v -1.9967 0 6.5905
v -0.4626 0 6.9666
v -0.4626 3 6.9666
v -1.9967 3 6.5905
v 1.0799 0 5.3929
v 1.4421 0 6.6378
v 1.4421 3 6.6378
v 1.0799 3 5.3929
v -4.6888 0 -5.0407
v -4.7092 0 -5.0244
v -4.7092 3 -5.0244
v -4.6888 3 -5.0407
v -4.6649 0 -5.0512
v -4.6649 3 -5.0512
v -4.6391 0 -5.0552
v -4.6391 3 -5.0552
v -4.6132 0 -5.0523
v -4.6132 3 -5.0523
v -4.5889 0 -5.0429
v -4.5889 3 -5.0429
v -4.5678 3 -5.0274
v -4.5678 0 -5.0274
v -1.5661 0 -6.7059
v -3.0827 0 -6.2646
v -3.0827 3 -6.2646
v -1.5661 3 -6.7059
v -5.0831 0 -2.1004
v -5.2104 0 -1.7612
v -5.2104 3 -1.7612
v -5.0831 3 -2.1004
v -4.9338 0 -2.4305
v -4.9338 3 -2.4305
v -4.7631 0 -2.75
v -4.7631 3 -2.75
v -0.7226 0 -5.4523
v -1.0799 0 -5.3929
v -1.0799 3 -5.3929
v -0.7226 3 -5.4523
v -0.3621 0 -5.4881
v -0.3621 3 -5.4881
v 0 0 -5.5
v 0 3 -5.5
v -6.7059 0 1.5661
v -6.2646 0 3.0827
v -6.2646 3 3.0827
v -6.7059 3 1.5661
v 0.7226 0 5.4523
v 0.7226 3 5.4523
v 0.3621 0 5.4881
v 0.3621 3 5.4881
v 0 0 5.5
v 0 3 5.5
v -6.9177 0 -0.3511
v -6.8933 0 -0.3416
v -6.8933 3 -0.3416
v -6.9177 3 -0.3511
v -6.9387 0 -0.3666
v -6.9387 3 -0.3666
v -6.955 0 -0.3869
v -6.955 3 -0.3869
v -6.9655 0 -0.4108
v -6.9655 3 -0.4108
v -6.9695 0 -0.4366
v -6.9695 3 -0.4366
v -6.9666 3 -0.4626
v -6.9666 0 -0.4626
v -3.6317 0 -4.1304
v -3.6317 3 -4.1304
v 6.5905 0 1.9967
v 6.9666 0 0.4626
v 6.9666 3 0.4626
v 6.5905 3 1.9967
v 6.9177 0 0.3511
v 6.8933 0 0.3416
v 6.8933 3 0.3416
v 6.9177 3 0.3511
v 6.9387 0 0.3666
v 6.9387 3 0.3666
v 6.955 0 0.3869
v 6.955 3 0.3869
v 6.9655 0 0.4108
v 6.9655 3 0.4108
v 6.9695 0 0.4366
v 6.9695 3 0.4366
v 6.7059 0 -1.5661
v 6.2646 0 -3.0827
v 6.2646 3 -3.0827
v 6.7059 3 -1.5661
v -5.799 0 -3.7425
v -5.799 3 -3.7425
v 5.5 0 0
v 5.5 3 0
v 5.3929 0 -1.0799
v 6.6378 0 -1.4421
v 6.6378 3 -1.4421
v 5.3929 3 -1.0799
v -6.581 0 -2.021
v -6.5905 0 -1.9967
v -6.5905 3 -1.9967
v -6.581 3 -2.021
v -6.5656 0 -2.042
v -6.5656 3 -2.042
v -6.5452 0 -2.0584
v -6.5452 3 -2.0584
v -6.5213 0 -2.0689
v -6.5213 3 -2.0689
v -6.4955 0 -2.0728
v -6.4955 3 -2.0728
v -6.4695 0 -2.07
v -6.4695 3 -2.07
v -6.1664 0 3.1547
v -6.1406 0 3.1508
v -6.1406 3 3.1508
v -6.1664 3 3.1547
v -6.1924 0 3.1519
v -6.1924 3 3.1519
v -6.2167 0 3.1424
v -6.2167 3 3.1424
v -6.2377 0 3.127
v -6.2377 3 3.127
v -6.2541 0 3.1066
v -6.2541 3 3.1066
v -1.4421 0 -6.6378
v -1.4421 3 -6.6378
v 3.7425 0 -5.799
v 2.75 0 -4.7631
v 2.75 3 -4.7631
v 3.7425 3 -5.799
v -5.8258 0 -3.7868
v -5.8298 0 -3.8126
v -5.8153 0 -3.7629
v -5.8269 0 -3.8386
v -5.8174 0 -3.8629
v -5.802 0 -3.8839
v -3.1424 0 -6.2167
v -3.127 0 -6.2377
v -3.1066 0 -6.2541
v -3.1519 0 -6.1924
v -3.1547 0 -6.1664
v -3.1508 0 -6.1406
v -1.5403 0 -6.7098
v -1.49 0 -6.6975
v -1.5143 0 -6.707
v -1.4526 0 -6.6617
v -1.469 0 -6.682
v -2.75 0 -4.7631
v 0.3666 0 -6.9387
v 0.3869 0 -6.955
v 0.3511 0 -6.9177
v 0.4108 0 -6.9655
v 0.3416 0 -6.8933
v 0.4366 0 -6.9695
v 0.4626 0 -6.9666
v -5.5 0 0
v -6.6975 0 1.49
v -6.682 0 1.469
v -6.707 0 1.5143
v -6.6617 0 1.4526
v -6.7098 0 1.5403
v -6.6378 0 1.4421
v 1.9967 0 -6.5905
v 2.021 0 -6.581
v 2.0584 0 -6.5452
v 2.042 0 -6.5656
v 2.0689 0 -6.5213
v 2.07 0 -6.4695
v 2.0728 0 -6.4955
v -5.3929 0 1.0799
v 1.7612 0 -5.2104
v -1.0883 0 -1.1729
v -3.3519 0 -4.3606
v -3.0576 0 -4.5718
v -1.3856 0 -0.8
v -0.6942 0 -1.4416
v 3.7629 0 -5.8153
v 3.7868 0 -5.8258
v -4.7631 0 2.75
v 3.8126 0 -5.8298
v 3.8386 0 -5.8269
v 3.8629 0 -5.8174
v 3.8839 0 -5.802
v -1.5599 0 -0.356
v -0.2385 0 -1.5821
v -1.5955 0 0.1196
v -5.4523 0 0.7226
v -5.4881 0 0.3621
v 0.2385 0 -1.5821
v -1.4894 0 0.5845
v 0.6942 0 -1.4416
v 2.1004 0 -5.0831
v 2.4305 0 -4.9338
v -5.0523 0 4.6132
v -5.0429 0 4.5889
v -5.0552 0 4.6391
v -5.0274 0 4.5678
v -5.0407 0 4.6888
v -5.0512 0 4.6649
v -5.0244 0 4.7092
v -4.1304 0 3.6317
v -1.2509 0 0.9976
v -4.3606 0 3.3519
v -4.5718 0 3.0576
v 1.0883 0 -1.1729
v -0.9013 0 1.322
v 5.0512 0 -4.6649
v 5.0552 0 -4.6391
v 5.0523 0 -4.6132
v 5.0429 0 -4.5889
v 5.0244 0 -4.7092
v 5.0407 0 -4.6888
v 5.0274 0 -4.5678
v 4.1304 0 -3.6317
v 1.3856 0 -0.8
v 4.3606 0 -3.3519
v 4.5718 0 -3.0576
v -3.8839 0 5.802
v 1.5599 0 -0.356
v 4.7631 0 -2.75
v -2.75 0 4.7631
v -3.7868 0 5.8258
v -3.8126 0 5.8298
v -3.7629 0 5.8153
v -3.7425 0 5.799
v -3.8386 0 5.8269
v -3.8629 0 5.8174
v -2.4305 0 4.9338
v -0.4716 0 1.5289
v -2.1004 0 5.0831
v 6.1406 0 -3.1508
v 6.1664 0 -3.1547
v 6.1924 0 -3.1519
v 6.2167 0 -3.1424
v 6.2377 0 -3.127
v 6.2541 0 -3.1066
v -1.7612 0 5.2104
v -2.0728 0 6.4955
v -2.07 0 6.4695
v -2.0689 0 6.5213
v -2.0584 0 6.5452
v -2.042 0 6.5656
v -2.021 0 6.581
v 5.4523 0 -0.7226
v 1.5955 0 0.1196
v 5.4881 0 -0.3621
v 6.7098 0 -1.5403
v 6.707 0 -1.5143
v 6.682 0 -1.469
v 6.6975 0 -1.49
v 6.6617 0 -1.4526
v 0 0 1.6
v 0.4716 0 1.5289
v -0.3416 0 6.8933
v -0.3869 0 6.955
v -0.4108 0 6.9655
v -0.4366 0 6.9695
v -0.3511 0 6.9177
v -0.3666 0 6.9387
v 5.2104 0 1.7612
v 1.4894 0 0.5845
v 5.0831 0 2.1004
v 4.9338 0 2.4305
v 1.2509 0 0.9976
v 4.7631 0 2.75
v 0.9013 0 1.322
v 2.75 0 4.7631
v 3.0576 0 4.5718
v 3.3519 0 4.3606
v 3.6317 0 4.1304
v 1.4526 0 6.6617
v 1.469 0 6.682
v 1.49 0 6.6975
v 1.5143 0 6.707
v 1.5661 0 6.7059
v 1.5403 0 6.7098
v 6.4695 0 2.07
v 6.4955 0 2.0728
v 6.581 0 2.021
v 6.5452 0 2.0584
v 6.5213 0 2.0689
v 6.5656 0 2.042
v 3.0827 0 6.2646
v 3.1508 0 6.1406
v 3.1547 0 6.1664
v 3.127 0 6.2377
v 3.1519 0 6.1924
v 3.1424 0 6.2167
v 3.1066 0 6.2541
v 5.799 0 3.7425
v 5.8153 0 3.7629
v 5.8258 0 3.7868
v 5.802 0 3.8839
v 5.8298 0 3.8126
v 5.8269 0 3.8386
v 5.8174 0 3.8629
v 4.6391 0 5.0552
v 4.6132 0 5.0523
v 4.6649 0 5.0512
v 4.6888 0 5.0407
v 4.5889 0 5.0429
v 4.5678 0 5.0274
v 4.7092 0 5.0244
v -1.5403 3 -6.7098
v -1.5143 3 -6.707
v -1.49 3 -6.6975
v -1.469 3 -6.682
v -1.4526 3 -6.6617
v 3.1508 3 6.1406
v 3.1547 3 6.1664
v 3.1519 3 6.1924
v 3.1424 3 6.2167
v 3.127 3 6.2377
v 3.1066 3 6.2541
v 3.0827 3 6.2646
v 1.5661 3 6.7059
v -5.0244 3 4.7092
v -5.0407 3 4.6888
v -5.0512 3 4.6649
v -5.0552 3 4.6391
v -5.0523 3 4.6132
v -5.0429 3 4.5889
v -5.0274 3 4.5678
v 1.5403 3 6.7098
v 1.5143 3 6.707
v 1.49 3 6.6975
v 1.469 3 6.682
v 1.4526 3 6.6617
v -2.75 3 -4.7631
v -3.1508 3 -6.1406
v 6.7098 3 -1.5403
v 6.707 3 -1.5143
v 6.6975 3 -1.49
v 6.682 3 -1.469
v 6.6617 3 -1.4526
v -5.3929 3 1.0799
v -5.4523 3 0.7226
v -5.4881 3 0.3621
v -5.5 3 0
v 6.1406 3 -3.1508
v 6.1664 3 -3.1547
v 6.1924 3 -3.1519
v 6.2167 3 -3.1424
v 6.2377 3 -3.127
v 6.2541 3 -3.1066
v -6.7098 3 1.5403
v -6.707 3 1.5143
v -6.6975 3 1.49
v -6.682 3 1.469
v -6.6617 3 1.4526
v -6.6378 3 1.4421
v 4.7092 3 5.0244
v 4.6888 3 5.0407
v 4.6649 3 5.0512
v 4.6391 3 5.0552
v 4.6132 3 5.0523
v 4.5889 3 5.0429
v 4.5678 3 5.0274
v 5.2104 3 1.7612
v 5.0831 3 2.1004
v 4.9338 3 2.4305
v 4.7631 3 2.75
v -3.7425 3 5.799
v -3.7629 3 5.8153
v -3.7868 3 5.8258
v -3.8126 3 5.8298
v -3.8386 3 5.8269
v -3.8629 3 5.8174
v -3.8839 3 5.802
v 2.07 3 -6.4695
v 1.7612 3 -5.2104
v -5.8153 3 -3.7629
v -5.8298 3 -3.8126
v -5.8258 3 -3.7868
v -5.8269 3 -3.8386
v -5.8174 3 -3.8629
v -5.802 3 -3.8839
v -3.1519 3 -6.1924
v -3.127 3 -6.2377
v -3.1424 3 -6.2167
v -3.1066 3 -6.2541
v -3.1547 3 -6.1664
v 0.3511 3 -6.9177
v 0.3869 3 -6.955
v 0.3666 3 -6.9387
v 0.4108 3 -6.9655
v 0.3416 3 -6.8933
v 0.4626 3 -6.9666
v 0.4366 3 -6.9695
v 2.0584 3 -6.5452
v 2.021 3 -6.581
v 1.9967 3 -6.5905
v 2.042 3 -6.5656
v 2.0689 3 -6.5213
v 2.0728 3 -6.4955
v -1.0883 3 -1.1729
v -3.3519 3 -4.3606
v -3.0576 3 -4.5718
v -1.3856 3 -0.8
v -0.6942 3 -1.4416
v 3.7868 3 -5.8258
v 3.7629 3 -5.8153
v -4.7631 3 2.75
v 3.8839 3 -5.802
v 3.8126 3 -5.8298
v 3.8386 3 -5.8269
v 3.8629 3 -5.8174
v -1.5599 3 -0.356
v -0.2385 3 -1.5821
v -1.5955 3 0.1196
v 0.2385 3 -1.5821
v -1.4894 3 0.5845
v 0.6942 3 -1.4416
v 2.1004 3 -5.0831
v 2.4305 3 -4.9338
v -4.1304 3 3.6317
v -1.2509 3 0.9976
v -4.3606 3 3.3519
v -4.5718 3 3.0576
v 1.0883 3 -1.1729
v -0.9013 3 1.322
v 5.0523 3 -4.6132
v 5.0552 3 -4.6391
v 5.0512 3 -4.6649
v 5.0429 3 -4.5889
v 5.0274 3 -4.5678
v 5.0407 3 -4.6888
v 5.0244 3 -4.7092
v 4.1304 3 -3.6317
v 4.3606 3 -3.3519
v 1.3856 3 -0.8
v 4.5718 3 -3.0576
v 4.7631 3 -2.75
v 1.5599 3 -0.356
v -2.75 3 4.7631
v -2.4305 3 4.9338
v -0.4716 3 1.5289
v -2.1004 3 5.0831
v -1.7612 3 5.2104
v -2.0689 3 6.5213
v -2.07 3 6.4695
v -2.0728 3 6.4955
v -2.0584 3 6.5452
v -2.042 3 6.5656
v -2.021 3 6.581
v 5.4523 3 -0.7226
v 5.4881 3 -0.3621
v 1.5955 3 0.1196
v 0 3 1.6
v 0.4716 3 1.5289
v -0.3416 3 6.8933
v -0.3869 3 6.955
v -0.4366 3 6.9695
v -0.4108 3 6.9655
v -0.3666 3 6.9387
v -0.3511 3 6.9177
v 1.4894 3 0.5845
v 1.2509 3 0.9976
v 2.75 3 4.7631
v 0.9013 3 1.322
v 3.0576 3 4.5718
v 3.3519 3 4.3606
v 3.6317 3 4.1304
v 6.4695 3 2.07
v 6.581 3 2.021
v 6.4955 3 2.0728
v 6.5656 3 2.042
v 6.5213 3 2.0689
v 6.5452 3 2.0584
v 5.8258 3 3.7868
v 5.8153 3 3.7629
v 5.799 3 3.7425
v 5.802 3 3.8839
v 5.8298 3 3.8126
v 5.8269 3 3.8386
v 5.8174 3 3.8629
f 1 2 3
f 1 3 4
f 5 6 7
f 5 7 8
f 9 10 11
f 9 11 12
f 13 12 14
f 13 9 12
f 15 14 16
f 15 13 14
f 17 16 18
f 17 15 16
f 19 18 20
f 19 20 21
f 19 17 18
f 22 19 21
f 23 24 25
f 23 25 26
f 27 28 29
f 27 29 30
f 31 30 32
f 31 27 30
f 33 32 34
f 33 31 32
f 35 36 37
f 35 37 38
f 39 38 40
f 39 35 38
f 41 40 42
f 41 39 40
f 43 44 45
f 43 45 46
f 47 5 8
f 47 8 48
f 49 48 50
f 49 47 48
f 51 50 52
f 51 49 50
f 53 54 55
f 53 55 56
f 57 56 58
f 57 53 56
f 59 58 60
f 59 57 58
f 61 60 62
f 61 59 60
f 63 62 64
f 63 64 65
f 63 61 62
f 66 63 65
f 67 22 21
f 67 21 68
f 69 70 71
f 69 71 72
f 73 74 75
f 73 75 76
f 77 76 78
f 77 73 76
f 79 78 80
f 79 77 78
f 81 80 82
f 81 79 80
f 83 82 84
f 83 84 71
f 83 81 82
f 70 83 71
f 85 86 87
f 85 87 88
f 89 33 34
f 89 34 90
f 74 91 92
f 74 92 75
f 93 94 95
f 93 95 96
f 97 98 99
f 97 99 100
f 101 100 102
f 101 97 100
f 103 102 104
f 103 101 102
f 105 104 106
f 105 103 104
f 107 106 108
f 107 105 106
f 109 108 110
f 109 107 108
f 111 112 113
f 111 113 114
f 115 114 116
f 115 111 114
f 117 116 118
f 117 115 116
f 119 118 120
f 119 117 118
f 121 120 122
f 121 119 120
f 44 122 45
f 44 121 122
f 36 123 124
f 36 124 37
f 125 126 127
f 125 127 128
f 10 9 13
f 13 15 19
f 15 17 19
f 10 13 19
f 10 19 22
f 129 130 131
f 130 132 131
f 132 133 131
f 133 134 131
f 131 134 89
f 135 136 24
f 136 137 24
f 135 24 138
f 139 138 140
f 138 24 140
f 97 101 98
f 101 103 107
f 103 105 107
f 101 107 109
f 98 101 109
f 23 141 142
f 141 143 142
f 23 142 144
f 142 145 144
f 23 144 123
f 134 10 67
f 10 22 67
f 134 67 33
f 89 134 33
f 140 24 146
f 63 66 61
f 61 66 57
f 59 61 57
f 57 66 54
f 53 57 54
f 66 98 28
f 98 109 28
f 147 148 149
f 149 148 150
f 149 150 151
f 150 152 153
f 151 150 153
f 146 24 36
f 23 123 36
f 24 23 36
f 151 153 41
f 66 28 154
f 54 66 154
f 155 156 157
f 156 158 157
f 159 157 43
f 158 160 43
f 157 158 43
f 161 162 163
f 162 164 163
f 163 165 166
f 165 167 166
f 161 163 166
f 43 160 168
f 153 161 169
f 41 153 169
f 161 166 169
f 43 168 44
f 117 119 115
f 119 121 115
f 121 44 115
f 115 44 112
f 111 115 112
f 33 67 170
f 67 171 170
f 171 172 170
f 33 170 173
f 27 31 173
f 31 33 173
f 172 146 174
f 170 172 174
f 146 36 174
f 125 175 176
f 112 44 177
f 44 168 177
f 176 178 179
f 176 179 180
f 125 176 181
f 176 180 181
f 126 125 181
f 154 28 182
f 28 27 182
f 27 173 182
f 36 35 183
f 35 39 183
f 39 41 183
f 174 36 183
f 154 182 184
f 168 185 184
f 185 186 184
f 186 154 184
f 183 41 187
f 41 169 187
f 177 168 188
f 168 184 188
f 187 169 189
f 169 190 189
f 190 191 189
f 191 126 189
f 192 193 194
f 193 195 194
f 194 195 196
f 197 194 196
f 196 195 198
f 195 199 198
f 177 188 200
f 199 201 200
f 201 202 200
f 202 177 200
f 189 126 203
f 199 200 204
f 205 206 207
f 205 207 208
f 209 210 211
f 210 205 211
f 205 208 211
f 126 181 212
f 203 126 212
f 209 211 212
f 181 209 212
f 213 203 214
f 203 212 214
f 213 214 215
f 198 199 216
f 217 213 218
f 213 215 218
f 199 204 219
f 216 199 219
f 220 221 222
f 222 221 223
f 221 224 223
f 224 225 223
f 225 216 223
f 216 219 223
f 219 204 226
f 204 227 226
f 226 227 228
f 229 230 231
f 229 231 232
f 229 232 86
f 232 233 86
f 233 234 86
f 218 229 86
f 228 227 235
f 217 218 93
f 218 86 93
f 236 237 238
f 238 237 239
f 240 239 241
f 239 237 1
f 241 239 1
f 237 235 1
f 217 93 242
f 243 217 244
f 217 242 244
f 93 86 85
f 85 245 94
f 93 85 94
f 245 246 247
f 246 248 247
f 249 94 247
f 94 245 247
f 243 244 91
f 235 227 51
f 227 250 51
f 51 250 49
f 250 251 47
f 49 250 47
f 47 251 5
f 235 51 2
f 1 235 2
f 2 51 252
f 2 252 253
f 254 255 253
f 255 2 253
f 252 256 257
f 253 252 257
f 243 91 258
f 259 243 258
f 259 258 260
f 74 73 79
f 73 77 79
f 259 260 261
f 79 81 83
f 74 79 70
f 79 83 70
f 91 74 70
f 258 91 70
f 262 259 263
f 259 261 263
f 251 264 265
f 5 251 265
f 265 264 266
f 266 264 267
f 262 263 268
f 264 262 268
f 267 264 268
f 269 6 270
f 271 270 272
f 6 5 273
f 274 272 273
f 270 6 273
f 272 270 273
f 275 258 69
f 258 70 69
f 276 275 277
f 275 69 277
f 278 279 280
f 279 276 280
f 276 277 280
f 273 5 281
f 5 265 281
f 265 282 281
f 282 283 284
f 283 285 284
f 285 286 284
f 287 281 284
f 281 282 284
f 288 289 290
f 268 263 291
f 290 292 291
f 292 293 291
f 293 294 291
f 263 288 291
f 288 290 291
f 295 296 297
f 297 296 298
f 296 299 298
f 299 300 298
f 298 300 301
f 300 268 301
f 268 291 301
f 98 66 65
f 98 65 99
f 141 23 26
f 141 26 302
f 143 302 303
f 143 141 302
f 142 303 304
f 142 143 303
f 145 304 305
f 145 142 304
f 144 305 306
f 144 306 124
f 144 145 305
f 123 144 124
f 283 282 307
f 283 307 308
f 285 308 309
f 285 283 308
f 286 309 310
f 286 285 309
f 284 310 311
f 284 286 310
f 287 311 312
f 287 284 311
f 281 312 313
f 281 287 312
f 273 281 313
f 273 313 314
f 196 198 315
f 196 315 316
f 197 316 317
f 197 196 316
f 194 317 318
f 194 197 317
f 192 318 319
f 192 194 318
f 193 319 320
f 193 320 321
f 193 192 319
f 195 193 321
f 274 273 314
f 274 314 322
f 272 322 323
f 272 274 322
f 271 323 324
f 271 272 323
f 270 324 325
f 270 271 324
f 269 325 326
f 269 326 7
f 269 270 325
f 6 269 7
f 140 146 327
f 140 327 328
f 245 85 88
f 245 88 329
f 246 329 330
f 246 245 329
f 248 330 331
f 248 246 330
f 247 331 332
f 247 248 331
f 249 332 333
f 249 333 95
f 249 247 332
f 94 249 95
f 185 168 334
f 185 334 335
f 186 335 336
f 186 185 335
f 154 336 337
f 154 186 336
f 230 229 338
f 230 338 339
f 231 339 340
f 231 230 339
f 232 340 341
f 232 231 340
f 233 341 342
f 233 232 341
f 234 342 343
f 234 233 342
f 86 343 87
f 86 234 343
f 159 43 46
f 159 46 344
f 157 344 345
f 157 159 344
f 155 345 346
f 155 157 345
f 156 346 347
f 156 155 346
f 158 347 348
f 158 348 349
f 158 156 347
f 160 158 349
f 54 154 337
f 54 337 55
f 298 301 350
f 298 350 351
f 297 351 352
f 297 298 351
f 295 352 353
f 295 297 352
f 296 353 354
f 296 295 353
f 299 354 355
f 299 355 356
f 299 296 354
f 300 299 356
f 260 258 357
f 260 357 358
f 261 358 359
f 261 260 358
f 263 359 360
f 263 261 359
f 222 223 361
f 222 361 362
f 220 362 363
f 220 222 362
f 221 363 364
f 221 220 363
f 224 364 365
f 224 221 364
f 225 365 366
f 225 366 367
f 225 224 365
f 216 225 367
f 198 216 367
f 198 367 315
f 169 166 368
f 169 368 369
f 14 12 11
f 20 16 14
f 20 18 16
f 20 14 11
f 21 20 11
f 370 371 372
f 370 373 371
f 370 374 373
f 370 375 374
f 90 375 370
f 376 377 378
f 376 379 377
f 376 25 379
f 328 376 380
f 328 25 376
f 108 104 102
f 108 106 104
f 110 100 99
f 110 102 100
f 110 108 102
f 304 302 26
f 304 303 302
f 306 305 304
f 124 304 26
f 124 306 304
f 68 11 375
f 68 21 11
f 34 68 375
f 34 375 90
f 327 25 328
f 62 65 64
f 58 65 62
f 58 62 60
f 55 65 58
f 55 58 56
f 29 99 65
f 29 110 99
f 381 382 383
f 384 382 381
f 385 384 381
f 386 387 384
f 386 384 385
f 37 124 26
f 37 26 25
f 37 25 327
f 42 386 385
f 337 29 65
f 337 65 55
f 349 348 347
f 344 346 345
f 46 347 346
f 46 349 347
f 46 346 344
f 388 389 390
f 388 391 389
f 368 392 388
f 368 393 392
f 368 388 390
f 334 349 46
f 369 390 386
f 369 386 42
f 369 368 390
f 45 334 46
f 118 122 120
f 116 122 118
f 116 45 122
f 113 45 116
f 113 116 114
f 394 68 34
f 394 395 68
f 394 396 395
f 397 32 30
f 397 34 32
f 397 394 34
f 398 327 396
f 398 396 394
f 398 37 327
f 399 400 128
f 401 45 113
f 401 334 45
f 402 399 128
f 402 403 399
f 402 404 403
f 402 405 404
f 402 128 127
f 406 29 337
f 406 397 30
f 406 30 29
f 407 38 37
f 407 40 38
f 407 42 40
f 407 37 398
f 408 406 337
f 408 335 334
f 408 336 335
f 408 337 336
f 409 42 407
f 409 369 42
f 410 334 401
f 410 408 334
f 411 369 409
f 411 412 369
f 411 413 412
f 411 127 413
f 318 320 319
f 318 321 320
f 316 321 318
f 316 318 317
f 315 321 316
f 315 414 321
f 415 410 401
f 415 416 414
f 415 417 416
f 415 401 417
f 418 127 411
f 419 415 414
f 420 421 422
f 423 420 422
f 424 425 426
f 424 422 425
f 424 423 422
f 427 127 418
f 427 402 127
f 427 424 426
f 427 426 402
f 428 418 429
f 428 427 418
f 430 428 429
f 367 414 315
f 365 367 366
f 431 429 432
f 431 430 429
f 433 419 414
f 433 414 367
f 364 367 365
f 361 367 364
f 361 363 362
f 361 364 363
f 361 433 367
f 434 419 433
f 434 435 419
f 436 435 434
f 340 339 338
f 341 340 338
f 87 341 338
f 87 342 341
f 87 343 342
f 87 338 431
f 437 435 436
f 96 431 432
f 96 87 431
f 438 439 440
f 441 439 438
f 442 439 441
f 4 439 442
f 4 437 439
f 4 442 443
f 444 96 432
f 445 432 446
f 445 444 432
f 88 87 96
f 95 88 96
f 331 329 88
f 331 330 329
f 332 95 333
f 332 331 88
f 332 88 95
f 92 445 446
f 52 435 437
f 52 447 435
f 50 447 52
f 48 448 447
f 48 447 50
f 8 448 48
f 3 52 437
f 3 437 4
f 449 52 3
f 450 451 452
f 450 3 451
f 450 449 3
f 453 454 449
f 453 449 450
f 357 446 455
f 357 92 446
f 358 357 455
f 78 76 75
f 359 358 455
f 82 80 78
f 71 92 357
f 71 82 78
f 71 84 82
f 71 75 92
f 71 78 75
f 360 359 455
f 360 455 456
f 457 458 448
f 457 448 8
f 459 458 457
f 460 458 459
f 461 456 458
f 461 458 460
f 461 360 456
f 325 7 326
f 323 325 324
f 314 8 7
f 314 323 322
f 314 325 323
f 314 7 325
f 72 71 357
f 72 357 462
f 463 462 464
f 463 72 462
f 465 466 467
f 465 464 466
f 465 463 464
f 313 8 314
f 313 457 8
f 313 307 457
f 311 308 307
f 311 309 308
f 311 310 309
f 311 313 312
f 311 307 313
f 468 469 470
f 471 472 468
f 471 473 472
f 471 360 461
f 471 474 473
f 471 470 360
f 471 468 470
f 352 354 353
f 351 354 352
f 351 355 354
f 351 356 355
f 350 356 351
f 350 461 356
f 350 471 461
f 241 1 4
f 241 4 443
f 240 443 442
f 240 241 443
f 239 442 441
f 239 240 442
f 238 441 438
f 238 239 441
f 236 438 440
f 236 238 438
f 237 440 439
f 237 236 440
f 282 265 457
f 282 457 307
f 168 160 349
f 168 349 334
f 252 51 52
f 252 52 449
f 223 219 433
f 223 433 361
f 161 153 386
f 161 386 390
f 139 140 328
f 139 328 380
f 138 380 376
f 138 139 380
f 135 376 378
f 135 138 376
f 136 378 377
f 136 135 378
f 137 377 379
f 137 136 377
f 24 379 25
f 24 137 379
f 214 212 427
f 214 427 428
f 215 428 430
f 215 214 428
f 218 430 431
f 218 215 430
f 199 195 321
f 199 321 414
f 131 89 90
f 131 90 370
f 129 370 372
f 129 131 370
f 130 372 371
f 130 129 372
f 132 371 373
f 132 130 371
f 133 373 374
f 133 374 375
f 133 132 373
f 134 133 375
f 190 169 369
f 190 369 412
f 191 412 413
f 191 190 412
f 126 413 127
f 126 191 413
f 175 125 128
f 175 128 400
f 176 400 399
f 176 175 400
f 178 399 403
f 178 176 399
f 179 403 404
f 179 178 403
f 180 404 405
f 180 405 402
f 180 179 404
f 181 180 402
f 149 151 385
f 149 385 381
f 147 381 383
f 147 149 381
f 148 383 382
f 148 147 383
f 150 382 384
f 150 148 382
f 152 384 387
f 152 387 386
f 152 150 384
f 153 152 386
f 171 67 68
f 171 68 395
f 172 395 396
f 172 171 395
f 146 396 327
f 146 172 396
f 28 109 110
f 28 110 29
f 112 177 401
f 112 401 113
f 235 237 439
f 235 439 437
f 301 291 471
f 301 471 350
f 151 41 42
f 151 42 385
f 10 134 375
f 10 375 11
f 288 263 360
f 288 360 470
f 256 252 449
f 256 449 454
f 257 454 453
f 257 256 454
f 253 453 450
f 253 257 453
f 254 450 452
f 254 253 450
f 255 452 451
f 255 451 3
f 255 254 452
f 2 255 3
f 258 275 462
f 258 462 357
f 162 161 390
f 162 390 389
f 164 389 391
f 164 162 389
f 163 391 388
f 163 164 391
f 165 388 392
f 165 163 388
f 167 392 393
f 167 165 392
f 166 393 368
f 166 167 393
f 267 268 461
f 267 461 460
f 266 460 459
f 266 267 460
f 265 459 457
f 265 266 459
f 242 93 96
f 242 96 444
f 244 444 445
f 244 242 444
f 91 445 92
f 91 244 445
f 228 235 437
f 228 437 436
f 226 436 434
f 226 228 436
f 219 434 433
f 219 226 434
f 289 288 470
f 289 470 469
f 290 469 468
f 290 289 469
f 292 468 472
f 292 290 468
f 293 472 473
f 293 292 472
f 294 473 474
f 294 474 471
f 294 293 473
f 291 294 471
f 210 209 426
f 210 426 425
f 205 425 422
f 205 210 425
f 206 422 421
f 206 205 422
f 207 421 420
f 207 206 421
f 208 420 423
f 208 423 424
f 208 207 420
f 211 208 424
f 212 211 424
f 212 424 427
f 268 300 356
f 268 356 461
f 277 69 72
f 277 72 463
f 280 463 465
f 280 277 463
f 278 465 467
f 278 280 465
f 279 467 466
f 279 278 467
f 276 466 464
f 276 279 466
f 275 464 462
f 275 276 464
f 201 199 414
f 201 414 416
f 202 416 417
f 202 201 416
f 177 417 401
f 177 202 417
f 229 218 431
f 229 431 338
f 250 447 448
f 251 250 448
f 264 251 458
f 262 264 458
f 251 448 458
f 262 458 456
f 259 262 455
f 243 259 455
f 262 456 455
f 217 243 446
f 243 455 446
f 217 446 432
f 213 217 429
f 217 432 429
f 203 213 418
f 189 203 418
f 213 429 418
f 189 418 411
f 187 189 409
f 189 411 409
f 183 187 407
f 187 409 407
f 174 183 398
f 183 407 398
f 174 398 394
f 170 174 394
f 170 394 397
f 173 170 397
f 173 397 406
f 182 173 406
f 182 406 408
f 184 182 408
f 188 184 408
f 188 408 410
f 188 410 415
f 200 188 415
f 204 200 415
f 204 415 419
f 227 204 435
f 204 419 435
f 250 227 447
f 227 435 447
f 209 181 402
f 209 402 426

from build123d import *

# Parameters (mm, degrees)
SKETCH1_R               = 7
BOSS_EXTRUDE1_DEPTH     = 3
CUT_EXTRUDE1_DEPTH      = 11.344080433
CUT_EXTRUDE1_DEPTH_BACK = 3
SKETCH5_R               = 1.6
CUT_EXTRUDE2_DEPTH      = 3


with BuildPart() as part:
    # Sketch1 → Boss-Extrude1 (new body)
    with BuildSketch(Plane(origin=(0, 0, 0), x_dir=(1, 0, 0), z_dir=(0, 1, 0))):
        with Locations(Location((0, 0, 0), (0, 0, 270))):
            Circle(SKETCH1_R)
    extrude(amount=BOSS_EXTRUDE1_DEPTH)

    # Sketch2 → Cut-Extrude1 (cut, two sides: drawn at the far end of the back side and taken through both)
    with BuildSketch(Plane(origin=(0, 3, 0), x_dir=(1, 0, 0), z_dir=(0, 1, 0)).offset(-CUT_EXTRUDE1_DEPTH_BACK)):
        with BuildLine():
            ThreePointArc((-1.079936716, 5.392933959), (-0.542615529, 5.473168039), (0, 5.5))
            Line((0, 5.5), (0, 7))
            ThreePointArc((0, 7), (-7, 0), (0, -7))
            Line((0, -7), (0, -5.5))
            Line((0, -5.5), (-0.341646298, -6.893330445))
            ThreePointArc((-0.341646298, -6.893330445), (-0.386932449, -6.955031571), (-0.462583878, -6.966638711))
            Line((-0.462583878, -6.966638711), (-1.996653446, -6.590483011))
            ThreePointArc((-1.996653446, -6.590483011), (-2.058354572, -6.54519686), (-2.069961712, -6.469545431))
            Line((-2.069961712, -6.469545431), (-1.761214349, -5.210386168))
            ThreePointArc((-1.761214349, -5.210386168), (-2.266665187, -5.011210326), (-2.75, -4.763139721))
            Line((-2.75, -4.763139721), (-3.742539596, -5.798976134))
            ThreePointArc((-3.742539596, -5.798976134), (-3.812609116, -5.8297678), (-3.883928745, -5.801994164))
            Line((-3.883928745, -5.801994164), (-5.024394113, -4.709198988))
            ThreePointArc((-5.024394113, -4.709198988), (-5.055185779, -4.639129468), (-5.027412143, -4.567809838))
            Line((-5.027412143, -4.567809838), (-4.130449452, -3.63171961))
            ThreePointArc((-4.130449452, -3.63171961), (-4.468594797, -3.206502852), (-4.763139721, -2.75))
            Line((-4.763139721, -2.75), (-6.140622431, -3.15079085))
            ThreePointArc((-6.140622431, -3.15079085), (-6.216700249, -3.142422455), (-6.264578041, -3.082709966))
            Line((-6.264578041, -3.082709966), (-6.705852434, -1.566088898))
            ThreePointArc((-6.705852434, -1.566088898), (-6.69748404, -1.490011081), (-6.63777155, -1.442133288))
            Line((-6.63777155, -1.442133288), (-5.392933959, -1.079936716))
            ThreePointArc((-5.392933959, -1.079936716), (-5.473168039, -0.542615529), (-5.5, 0))
            Line((-5.5, 0), (-6.893330445, 0.341646298))
            ThreePointArc((-6.893330445, 0.341646298), (-6.955031571, 0.386932449), (-6.966638711, 0.462583878))
            Line((-6.966638711, 0.462583878), (-6.590483011, 1.996653446))
            ThreePointArc((-6.590483011, 1.996653446), (-6.54519686, 2.058354572), (-6.469545431, 2.069961712))
            Line((-6.469545431, 2.069961712), (-5.210386168, 1.761214349))
            ThreePointArc((-5.210386168, 1.761214349), (-5.011210326, 2.266665187), (-4.763139721, 2.75))
            Line((-4.763139721, 2.75), (-5.798976134, 3.742539596))
            ThreePointArc((-5.798976134, 3.742539596), (-5.8297678, 3.812609116), (-5.801994164, 3.883928745))
            Line((-5.801994164, 3.883928745), (-4.709198988, 5.024394113))
            ThreePointArc((-4.709198988, 5.024394113), (-4.639129468, 5.055185779), (-4.567809838, 5.027412143))
            Line((-4.567809838, 5.027412143), (-3.63171961, 4.130449452))
            ThreePointArc((-3.63171961, 4.130449452), (-3.206502852, 4.468594797), (-2.75, 4.763139721))
            Line((-2.75, 4.763139721), (-3.15079085, 6.140622431))
            ThreePointArc((-3.15079085, 6.140622431), (-3.142422455, 6.216700249), (-3.082709966, 6.264578041))
            Line((-3.082709966, 6.264578041), (-1.566088898, 6.705852434))
            ThreePointArc((-1.566088898, 6.705852434), (-1.490011081, 6.69748404), (-1.442133288, 6.63777155))
            Line((-1.442133288, 6.63777155), (-1.079936716, 5.392933959))
        make_face()
        with BuildLine():
            Line((0, 7), (0, 5.5))
            Line((0, 5.5), (0.341646298, 6.893330445))
            ThreePointArc((0.341646298, 6.893330445), (0.386932449, 6.955031571), (0.462583878, 6.966638711))
            Line((0.462583878, 6.966638711), (1.996653446, 6.590483011))
            ThreePointArc((1.996653446, 6.590483011), (2.058354572, 6.54519686), (2.069961712, 6.469545431))
            Line((2.069961712, 6.469545431), (1.761214349, 5.210386168))
            ThreePointArc((1.761214349, 5.210386168), (2.266665187, 5.011210326), (2.75, 4.763139721))
            Line((2.75, 4.763139721), (3.742539596, 5.798976134))
            ThreePointArc((3.742539596, 5.798976134), (3.812609116, 5.8297678), (3.883928745, 5.801994164))
            Line((3.883928745, 5.801994164), (5.024394113, 4.709198988))
            ThreePointArc((5.024394113, 4.709198988), (5.055185779, 4.639129468), (5.027412143, 4.567809838))
            Line((5.027412143, 4.567809838), (4.130449452, 3.63171961))
            ThreePointArc((4.130449452, 3.63171961), (4.468594797, 3.206502852), (4.763139721, 2.75))
            Line((4.763139721, 2.75), (6.140622431, 3.15079085))
            ThreePointArc((6.140622431, 3.15079085), (6.216700249, 3.142422455), (6.264578041, 3.082709966))
            Line((6.264578041, 3.082709966), (6.705852434, 1.566088898))
            ThreePointArc((6.705852434, 1.566088898), (6.69748404, 1.490011081), (6.63777155, 1.442133288))
            Line((6.63777155, 1.442133288), (5.392933959, 1.079936716))
            ThreePointArc((5.392933959, 1.079936716), (5.473168039, 0.542615529), (5.5, 0))
            Line((5.5, 0), (6.893330445, -0.341646298))
            ThreePointArc((6.893330445, -0.341646298), (6.955031571, -0.386932449), (6.966638711, -0.462583878))
            Line((6.966638711, -0.462583878), (6.590483011, -1.996653446))
            ThreePointArc((6.590483011, -1.996653446), (6.54519686, -2.058354572), (6.469545431, -2.069961712))
            Line((6.469545431, -2.069961712), (5.210386168, -1.761214349))
            ThreePointArc((5.210386168, -1.761214349), (5.011210326, -2.266665187), (4.763139721, -2.75))
            Line((4.763139721, -2.75), (5.798976134, -3.742539596))
            ThreePointArc((5.798976134, -3.742539596), (5.8297678, -3.812609116), (5.801994164, -3.883928745))
            Line((5.801994164, -3.883928745), (4.709198988, -5.024394113))
            ThreePointArc((4.709198988, -5.024394113), (4.639129468, -5.055185779), (4.567809838, -5.027412143))
            Line((4.567809838, -5.027412143), (3.63171961, -4.130449452))
            ThreePointArc((3.63171961, -4.130449452), (3.206502852, -4.468594797), (2.75, -4.763139721))
            Line((2.75, -4.763139721), (3.15079085, -6.140622431))
            ThreePointArc((3.15079085, -6.140622431), (3.142422455, -6.216700249), (3.082709966, -6.264578041))
            Line((3.082709966, -6.264578041), (1.566088898, -6.705852434))
            ThreePointArc((1.566088898, -6.705852434), (1.490011081, -6.69748404), (1.442133288, -6.63777155))
            Line((1.442133288, -6.63777155), (1.079936716, -5.392933959))
            ThreePointArc((1.079936716, -5.392933959), (0.542615529, -5.473168039), (0, -5.5))
            Line((0, -5.5), (0, -7))
            ThreePointArc((0, -7), (4.949747468, -4.949747468), (7, 0))
            ThreePointArc((7, 0), (4.949747468, 4.949747468), (0, 7))
        make_face()
    extrude(amount=CUT_EXTRUDE1_DEPTH + CUT_EXTRUDE1_DEPTH_BACK, mode=Mode.SUBTRACT)

    # Sketch5 → Cut-Extrude2 (cut)
    with BuildSketch(Plane(origin=(0, 3, 0), x_dir=(1, 0, 0), z_dir=(0, 1, 0))):
        with Locations(Location((0, 0, 0), (0, 0, 270))):
            Circle(SKETCH5_R)
    extrude(amount=-CUT_EXTRUDE2_DEPTH, mode=Mode.SUBTRACT)


solid = part.part
